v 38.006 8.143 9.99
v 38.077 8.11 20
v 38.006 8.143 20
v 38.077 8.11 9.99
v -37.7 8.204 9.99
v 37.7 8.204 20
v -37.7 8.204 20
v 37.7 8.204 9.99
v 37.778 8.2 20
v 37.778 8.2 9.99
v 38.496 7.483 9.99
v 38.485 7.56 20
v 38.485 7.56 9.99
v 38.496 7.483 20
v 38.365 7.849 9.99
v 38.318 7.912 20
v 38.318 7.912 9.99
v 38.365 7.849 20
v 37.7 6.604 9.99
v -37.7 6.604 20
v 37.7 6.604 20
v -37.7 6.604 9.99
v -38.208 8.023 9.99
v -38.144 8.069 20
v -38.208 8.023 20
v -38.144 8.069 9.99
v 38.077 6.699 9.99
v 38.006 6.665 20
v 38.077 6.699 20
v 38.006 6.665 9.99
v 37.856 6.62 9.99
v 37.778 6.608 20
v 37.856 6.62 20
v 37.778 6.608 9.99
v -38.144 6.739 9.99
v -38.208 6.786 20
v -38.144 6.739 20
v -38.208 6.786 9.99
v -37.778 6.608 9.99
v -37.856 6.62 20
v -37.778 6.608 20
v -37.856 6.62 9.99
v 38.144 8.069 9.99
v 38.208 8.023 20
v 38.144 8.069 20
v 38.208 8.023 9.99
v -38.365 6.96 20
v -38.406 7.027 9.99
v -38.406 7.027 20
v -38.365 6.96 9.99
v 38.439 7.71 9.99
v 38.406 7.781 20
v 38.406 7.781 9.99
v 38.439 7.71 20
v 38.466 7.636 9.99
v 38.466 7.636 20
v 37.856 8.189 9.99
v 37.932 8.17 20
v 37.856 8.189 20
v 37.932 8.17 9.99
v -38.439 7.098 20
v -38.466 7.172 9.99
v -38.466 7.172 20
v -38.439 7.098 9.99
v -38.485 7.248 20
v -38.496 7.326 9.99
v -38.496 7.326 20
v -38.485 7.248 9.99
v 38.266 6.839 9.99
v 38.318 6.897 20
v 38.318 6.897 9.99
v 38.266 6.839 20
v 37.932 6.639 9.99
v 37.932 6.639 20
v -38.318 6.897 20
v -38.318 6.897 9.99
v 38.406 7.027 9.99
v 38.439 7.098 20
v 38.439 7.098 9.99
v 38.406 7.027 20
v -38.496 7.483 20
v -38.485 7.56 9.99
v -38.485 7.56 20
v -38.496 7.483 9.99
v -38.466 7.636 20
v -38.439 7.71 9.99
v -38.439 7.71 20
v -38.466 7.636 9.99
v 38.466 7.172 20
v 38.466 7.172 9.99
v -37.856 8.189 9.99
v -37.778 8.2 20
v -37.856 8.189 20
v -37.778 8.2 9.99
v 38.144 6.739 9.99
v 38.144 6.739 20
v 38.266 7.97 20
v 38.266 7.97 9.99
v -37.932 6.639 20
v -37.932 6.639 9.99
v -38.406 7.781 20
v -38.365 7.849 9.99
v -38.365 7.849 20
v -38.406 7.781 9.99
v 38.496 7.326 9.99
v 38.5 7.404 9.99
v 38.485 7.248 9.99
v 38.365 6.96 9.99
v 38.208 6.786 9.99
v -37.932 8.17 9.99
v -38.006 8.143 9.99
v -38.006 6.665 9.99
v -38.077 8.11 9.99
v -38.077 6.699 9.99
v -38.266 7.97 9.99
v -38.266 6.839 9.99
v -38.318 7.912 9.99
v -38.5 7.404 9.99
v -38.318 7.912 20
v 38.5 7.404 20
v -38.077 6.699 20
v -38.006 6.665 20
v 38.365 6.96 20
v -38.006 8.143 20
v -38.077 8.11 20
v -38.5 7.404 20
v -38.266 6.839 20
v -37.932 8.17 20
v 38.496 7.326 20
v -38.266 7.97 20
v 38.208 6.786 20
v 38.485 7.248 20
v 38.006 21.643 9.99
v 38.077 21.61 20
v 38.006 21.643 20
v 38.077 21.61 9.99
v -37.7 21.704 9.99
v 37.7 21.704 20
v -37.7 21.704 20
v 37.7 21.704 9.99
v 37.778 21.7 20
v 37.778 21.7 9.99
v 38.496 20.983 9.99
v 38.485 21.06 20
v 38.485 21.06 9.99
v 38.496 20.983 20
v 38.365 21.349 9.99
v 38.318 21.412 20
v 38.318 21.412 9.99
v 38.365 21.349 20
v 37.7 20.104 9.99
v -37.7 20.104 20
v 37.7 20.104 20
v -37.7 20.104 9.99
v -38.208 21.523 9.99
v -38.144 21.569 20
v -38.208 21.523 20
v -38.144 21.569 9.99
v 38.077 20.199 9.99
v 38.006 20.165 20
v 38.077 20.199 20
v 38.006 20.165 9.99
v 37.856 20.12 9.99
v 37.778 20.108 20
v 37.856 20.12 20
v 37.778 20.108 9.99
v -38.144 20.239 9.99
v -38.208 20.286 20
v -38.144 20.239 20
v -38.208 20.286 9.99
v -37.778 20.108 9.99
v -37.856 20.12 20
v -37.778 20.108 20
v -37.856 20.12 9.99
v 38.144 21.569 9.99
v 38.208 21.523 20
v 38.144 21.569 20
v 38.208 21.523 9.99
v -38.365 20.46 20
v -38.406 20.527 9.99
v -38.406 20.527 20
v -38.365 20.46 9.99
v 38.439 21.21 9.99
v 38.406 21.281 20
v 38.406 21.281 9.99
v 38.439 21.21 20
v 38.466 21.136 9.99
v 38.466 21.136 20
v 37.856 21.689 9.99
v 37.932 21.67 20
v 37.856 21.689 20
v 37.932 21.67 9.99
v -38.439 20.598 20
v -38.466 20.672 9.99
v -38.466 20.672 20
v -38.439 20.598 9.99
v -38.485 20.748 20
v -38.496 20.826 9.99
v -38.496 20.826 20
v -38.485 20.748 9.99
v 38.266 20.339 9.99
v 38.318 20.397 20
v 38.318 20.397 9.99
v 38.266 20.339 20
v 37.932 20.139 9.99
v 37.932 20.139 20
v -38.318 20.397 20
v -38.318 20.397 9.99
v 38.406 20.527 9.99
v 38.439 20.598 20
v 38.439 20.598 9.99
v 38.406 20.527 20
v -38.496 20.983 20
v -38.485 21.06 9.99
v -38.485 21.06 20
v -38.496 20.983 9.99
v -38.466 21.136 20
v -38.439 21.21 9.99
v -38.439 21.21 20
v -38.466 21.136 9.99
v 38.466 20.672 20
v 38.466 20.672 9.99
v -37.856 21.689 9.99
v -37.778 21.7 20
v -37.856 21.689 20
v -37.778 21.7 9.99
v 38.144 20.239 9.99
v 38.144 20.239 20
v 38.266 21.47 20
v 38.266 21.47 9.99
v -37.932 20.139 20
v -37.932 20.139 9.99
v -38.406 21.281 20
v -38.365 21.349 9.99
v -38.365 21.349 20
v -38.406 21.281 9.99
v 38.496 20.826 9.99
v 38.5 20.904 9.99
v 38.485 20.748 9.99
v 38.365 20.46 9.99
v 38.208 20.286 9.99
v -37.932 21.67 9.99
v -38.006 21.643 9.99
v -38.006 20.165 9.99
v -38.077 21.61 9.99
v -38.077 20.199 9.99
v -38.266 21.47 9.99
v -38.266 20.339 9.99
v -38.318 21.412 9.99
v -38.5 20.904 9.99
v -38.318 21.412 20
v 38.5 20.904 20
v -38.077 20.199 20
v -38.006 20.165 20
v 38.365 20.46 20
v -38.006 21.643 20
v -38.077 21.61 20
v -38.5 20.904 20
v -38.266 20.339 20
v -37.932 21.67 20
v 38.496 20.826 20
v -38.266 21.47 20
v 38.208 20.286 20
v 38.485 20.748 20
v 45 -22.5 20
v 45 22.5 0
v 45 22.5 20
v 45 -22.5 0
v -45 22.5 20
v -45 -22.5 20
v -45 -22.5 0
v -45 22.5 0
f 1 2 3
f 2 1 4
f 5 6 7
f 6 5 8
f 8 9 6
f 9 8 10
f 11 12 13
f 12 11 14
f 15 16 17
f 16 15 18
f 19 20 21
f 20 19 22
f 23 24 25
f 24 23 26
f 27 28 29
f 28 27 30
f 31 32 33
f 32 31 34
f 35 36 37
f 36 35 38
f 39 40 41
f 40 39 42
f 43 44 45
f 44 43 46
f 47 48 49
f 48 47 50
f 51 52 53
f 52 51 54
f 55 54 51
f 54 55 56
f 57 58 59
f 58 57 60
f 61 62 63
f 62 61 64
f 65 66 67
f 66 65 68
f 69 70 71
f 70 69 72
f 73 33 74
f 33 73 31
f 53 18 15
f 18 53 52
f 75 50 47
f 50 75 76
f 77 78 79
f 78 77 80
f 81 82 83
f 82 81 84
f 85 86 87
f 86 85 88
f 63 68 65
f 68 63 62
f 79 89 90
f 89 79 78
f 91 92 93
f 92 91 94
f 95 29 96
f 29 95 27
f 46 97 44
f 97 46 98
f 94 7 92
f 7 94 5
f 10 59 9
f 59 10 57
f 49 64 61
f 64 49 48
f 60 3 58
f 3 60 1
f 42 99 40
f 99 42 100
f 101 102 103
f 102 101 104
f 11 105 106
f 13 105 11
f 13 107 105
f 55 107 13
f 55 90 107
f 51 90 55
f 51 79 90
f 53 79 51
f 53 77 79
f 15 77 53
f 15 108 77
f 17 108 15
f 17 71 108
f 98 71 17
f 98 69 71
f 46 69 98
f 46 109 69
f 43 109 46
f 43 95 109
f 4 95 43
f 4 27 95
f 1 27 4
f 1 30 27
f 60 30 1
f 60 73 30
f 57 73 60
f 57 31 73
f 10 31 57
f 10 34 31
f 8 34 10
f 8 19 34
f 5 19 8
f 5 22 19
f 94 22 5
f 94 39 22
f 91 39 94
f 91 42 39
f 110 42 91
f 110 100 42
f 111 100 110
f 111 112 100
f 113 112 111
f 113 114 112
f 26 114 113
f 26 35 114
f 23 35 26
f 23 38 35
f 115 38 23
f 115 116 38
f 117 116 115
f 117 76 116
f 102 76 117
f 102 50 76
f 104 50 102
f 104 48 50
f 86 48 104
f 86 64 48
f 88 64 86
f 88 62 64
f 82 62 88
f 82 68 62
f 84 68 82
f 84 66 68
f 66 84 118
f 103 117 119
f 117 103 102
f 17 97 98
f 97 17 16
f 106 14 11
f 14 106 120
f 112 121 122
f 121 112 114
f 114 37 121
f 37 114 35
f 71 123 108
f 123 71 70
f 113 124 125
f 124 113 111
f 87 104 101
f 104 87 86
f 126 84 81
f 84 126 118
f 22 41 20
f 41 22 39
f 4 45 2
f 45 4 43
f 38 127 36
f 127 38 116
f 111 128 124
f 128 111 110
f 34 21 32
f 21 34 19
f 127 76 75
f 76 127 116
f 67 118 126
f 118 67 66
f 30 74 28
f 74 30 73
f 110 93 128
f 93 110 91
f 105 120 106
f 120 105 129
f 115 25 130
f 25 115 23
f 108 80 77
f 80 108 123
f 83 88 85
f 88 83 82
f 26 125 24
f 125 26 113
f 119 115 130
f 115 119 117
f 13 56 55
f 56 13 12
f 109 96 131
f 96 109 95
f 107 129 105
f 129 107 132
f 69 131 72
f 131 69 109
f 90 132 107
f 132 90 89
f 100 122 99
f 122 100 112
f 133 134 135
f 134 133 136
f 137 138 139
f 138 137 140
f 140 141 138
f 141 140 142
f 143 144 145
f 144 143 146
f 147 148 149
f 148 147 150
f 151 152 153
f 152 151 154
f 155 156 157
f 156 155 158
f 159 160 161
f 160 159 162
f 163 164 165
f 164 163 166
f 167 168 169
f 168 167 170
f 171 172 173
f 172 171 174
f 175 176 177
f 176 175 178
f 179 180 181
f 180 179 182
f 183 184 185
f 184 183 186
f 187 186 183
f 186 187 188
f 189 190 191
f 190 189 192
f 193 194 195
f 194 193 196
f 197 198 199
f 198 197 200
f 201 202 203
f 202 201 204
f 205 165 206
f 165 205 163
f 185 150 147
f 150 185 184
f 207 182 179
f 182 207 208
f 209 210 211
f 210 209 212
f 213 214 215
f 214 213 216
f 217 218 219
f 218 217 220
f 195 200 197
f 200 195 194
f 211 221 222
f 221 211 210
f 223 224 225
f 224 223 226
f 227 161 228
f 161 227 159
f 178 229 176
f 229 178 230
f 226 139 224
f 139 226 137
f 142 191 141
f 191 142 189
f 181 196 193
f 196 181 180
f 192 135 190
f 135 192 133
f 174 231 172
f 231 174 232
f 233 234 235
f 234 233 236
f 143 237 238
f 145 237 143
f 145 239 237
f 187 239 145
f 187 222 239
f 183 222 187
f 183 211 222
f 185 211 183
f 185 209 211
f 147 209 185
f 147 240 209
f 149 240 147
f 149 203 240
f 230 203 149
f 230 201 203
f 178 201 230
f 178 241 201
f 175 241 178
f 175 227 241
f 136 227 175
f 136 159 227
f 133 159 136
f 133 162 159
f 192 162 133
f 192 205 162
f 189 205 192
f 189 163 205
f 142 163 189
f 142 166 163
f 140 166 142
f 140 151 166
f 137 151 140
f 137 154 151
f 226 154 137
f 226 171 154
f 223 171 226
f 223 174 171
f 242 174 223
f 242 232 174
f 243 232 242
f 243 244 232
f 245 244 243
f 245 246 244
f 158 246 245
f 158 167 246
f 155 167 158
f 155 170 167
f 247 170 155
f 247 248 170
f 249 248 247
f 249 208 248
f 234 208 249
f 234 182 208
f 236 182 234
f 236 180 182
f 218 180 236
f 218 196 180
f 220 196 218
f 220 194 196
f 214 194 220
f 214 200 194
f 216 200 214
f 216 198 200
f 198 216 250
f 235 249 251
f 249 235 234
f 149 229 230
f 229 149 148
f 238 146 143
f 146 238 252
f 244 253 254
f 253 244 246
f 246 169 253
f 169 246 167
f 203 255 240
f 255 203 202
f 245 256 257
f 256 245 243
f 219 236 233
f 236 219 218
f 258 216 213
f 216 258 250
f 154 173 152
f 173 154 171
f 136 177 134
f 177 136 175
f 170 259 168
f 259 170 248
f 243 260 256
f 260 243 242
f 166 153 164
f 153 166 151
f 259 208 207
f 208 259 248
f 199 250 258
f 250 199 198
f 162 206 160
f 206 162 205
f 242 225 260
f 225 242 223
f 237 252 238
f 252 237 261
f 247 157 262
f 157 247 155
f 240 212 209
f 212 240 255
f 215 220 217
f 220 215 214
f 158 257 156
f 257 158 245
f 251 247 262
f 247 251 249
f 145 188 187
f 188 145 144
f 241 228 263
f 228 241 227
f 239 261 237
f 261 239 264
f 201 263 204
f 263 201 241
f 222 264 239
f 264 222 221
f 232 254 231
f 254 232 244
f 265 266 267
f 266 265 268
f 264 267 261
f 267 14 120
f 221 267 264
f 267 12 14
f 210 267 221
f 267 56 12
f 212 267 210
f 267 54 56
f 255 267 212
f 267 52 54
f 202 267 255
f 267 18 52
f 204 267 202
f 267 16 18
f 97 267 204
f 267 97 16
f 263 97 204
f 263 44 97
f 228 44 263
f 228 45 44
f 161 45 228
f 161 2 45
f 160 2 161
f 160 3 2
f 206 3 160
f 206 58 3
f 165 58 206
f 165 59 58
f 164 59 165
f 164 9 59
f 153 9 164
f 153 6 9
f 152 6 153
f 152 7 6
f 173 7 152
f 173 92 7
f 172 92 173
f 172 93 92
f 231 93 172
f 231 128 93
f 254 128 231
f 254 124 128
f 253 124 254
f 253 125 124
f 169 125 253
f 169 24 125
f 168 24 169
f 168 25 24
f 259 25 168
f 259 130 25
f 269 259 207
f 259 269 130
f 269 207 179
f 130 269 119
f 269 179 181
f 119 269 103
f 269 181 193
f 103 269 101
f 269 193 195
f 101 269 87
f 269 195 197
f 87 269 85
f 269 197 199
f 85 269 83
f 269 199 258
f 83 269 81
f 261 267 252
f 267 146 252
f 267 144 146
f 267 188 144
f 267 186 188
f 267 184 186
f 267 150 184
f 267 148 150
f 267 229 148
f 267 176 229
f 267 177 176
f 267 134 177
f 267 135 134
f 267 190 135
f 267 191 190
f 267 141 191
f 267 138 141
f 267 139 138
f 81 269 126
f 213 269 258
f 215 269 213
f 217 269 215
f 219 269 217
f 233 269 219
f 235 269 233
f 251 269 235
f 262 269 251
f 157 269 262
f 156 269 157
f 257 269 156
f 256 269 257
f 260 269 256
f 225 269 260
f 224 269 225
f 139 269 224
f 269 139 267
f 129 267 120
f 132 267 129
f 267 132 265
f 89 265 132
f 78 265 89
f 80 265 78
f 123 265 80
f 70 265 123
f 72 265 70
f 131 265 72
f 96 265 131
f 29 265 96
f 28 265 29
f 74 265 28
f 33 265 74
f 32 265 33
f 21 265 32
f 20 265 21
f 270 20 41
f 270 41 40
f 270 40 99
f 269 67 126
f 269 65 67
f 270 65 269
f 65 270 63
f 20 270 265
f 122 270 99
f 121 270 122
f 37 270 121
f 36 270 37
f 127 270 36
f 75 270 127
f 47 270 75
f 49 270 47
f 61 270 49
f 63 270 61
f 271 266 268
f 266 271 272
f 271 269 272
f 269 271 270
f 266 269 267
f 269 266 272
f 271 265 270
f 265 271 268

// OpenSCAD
// Built by bench/smallmodels/features/compiler.py from a list of features.
$fn = 64;
difference() {
  union() {
    translate([0, 0, 0]) translate([-45, -22.5, 0]) cube([90, 45, 20]);
  }
  union() {
    translate([0, -37.5958, 9.99]) rotate([0, 0, 0]) hull() { for (s = [-1, 1]) translate([s * 37.7, 0, 0]) cylinder(d = 1.6, h = 10.02); }
    translate([0, -24.0958, 9.99]) rotate([0, 0, 0]) hull() { for (s = [-1, 1]) translate([s * 37.7, 0, 0]) cylinder(d = 1.6, h = 10.02); }
    translate([0, 7.4042, 9.99]) rotate([0, 0, 0]) hull() { for (s = [-1, 1]) translate([s * 37.7, 0, 0]) cylinder(d = 1.6, h = 10.02); }
    translate([0, 20.9042, 9.99]) rotate([0, 0, 0]) hull() { for (s = [-1, 1]) translate([s * 37.7, 0, 0]) cylinder(d = 1.6, h = 10.02); }
    translate([0, 34.4042, 9.99]) rotate([0, 0, 0]) hull() { for (s = [-1, 1]) translate([s * 37.7, 0, 0]) cylinder(d = 1.6, h = 10.02); }
  }
}
